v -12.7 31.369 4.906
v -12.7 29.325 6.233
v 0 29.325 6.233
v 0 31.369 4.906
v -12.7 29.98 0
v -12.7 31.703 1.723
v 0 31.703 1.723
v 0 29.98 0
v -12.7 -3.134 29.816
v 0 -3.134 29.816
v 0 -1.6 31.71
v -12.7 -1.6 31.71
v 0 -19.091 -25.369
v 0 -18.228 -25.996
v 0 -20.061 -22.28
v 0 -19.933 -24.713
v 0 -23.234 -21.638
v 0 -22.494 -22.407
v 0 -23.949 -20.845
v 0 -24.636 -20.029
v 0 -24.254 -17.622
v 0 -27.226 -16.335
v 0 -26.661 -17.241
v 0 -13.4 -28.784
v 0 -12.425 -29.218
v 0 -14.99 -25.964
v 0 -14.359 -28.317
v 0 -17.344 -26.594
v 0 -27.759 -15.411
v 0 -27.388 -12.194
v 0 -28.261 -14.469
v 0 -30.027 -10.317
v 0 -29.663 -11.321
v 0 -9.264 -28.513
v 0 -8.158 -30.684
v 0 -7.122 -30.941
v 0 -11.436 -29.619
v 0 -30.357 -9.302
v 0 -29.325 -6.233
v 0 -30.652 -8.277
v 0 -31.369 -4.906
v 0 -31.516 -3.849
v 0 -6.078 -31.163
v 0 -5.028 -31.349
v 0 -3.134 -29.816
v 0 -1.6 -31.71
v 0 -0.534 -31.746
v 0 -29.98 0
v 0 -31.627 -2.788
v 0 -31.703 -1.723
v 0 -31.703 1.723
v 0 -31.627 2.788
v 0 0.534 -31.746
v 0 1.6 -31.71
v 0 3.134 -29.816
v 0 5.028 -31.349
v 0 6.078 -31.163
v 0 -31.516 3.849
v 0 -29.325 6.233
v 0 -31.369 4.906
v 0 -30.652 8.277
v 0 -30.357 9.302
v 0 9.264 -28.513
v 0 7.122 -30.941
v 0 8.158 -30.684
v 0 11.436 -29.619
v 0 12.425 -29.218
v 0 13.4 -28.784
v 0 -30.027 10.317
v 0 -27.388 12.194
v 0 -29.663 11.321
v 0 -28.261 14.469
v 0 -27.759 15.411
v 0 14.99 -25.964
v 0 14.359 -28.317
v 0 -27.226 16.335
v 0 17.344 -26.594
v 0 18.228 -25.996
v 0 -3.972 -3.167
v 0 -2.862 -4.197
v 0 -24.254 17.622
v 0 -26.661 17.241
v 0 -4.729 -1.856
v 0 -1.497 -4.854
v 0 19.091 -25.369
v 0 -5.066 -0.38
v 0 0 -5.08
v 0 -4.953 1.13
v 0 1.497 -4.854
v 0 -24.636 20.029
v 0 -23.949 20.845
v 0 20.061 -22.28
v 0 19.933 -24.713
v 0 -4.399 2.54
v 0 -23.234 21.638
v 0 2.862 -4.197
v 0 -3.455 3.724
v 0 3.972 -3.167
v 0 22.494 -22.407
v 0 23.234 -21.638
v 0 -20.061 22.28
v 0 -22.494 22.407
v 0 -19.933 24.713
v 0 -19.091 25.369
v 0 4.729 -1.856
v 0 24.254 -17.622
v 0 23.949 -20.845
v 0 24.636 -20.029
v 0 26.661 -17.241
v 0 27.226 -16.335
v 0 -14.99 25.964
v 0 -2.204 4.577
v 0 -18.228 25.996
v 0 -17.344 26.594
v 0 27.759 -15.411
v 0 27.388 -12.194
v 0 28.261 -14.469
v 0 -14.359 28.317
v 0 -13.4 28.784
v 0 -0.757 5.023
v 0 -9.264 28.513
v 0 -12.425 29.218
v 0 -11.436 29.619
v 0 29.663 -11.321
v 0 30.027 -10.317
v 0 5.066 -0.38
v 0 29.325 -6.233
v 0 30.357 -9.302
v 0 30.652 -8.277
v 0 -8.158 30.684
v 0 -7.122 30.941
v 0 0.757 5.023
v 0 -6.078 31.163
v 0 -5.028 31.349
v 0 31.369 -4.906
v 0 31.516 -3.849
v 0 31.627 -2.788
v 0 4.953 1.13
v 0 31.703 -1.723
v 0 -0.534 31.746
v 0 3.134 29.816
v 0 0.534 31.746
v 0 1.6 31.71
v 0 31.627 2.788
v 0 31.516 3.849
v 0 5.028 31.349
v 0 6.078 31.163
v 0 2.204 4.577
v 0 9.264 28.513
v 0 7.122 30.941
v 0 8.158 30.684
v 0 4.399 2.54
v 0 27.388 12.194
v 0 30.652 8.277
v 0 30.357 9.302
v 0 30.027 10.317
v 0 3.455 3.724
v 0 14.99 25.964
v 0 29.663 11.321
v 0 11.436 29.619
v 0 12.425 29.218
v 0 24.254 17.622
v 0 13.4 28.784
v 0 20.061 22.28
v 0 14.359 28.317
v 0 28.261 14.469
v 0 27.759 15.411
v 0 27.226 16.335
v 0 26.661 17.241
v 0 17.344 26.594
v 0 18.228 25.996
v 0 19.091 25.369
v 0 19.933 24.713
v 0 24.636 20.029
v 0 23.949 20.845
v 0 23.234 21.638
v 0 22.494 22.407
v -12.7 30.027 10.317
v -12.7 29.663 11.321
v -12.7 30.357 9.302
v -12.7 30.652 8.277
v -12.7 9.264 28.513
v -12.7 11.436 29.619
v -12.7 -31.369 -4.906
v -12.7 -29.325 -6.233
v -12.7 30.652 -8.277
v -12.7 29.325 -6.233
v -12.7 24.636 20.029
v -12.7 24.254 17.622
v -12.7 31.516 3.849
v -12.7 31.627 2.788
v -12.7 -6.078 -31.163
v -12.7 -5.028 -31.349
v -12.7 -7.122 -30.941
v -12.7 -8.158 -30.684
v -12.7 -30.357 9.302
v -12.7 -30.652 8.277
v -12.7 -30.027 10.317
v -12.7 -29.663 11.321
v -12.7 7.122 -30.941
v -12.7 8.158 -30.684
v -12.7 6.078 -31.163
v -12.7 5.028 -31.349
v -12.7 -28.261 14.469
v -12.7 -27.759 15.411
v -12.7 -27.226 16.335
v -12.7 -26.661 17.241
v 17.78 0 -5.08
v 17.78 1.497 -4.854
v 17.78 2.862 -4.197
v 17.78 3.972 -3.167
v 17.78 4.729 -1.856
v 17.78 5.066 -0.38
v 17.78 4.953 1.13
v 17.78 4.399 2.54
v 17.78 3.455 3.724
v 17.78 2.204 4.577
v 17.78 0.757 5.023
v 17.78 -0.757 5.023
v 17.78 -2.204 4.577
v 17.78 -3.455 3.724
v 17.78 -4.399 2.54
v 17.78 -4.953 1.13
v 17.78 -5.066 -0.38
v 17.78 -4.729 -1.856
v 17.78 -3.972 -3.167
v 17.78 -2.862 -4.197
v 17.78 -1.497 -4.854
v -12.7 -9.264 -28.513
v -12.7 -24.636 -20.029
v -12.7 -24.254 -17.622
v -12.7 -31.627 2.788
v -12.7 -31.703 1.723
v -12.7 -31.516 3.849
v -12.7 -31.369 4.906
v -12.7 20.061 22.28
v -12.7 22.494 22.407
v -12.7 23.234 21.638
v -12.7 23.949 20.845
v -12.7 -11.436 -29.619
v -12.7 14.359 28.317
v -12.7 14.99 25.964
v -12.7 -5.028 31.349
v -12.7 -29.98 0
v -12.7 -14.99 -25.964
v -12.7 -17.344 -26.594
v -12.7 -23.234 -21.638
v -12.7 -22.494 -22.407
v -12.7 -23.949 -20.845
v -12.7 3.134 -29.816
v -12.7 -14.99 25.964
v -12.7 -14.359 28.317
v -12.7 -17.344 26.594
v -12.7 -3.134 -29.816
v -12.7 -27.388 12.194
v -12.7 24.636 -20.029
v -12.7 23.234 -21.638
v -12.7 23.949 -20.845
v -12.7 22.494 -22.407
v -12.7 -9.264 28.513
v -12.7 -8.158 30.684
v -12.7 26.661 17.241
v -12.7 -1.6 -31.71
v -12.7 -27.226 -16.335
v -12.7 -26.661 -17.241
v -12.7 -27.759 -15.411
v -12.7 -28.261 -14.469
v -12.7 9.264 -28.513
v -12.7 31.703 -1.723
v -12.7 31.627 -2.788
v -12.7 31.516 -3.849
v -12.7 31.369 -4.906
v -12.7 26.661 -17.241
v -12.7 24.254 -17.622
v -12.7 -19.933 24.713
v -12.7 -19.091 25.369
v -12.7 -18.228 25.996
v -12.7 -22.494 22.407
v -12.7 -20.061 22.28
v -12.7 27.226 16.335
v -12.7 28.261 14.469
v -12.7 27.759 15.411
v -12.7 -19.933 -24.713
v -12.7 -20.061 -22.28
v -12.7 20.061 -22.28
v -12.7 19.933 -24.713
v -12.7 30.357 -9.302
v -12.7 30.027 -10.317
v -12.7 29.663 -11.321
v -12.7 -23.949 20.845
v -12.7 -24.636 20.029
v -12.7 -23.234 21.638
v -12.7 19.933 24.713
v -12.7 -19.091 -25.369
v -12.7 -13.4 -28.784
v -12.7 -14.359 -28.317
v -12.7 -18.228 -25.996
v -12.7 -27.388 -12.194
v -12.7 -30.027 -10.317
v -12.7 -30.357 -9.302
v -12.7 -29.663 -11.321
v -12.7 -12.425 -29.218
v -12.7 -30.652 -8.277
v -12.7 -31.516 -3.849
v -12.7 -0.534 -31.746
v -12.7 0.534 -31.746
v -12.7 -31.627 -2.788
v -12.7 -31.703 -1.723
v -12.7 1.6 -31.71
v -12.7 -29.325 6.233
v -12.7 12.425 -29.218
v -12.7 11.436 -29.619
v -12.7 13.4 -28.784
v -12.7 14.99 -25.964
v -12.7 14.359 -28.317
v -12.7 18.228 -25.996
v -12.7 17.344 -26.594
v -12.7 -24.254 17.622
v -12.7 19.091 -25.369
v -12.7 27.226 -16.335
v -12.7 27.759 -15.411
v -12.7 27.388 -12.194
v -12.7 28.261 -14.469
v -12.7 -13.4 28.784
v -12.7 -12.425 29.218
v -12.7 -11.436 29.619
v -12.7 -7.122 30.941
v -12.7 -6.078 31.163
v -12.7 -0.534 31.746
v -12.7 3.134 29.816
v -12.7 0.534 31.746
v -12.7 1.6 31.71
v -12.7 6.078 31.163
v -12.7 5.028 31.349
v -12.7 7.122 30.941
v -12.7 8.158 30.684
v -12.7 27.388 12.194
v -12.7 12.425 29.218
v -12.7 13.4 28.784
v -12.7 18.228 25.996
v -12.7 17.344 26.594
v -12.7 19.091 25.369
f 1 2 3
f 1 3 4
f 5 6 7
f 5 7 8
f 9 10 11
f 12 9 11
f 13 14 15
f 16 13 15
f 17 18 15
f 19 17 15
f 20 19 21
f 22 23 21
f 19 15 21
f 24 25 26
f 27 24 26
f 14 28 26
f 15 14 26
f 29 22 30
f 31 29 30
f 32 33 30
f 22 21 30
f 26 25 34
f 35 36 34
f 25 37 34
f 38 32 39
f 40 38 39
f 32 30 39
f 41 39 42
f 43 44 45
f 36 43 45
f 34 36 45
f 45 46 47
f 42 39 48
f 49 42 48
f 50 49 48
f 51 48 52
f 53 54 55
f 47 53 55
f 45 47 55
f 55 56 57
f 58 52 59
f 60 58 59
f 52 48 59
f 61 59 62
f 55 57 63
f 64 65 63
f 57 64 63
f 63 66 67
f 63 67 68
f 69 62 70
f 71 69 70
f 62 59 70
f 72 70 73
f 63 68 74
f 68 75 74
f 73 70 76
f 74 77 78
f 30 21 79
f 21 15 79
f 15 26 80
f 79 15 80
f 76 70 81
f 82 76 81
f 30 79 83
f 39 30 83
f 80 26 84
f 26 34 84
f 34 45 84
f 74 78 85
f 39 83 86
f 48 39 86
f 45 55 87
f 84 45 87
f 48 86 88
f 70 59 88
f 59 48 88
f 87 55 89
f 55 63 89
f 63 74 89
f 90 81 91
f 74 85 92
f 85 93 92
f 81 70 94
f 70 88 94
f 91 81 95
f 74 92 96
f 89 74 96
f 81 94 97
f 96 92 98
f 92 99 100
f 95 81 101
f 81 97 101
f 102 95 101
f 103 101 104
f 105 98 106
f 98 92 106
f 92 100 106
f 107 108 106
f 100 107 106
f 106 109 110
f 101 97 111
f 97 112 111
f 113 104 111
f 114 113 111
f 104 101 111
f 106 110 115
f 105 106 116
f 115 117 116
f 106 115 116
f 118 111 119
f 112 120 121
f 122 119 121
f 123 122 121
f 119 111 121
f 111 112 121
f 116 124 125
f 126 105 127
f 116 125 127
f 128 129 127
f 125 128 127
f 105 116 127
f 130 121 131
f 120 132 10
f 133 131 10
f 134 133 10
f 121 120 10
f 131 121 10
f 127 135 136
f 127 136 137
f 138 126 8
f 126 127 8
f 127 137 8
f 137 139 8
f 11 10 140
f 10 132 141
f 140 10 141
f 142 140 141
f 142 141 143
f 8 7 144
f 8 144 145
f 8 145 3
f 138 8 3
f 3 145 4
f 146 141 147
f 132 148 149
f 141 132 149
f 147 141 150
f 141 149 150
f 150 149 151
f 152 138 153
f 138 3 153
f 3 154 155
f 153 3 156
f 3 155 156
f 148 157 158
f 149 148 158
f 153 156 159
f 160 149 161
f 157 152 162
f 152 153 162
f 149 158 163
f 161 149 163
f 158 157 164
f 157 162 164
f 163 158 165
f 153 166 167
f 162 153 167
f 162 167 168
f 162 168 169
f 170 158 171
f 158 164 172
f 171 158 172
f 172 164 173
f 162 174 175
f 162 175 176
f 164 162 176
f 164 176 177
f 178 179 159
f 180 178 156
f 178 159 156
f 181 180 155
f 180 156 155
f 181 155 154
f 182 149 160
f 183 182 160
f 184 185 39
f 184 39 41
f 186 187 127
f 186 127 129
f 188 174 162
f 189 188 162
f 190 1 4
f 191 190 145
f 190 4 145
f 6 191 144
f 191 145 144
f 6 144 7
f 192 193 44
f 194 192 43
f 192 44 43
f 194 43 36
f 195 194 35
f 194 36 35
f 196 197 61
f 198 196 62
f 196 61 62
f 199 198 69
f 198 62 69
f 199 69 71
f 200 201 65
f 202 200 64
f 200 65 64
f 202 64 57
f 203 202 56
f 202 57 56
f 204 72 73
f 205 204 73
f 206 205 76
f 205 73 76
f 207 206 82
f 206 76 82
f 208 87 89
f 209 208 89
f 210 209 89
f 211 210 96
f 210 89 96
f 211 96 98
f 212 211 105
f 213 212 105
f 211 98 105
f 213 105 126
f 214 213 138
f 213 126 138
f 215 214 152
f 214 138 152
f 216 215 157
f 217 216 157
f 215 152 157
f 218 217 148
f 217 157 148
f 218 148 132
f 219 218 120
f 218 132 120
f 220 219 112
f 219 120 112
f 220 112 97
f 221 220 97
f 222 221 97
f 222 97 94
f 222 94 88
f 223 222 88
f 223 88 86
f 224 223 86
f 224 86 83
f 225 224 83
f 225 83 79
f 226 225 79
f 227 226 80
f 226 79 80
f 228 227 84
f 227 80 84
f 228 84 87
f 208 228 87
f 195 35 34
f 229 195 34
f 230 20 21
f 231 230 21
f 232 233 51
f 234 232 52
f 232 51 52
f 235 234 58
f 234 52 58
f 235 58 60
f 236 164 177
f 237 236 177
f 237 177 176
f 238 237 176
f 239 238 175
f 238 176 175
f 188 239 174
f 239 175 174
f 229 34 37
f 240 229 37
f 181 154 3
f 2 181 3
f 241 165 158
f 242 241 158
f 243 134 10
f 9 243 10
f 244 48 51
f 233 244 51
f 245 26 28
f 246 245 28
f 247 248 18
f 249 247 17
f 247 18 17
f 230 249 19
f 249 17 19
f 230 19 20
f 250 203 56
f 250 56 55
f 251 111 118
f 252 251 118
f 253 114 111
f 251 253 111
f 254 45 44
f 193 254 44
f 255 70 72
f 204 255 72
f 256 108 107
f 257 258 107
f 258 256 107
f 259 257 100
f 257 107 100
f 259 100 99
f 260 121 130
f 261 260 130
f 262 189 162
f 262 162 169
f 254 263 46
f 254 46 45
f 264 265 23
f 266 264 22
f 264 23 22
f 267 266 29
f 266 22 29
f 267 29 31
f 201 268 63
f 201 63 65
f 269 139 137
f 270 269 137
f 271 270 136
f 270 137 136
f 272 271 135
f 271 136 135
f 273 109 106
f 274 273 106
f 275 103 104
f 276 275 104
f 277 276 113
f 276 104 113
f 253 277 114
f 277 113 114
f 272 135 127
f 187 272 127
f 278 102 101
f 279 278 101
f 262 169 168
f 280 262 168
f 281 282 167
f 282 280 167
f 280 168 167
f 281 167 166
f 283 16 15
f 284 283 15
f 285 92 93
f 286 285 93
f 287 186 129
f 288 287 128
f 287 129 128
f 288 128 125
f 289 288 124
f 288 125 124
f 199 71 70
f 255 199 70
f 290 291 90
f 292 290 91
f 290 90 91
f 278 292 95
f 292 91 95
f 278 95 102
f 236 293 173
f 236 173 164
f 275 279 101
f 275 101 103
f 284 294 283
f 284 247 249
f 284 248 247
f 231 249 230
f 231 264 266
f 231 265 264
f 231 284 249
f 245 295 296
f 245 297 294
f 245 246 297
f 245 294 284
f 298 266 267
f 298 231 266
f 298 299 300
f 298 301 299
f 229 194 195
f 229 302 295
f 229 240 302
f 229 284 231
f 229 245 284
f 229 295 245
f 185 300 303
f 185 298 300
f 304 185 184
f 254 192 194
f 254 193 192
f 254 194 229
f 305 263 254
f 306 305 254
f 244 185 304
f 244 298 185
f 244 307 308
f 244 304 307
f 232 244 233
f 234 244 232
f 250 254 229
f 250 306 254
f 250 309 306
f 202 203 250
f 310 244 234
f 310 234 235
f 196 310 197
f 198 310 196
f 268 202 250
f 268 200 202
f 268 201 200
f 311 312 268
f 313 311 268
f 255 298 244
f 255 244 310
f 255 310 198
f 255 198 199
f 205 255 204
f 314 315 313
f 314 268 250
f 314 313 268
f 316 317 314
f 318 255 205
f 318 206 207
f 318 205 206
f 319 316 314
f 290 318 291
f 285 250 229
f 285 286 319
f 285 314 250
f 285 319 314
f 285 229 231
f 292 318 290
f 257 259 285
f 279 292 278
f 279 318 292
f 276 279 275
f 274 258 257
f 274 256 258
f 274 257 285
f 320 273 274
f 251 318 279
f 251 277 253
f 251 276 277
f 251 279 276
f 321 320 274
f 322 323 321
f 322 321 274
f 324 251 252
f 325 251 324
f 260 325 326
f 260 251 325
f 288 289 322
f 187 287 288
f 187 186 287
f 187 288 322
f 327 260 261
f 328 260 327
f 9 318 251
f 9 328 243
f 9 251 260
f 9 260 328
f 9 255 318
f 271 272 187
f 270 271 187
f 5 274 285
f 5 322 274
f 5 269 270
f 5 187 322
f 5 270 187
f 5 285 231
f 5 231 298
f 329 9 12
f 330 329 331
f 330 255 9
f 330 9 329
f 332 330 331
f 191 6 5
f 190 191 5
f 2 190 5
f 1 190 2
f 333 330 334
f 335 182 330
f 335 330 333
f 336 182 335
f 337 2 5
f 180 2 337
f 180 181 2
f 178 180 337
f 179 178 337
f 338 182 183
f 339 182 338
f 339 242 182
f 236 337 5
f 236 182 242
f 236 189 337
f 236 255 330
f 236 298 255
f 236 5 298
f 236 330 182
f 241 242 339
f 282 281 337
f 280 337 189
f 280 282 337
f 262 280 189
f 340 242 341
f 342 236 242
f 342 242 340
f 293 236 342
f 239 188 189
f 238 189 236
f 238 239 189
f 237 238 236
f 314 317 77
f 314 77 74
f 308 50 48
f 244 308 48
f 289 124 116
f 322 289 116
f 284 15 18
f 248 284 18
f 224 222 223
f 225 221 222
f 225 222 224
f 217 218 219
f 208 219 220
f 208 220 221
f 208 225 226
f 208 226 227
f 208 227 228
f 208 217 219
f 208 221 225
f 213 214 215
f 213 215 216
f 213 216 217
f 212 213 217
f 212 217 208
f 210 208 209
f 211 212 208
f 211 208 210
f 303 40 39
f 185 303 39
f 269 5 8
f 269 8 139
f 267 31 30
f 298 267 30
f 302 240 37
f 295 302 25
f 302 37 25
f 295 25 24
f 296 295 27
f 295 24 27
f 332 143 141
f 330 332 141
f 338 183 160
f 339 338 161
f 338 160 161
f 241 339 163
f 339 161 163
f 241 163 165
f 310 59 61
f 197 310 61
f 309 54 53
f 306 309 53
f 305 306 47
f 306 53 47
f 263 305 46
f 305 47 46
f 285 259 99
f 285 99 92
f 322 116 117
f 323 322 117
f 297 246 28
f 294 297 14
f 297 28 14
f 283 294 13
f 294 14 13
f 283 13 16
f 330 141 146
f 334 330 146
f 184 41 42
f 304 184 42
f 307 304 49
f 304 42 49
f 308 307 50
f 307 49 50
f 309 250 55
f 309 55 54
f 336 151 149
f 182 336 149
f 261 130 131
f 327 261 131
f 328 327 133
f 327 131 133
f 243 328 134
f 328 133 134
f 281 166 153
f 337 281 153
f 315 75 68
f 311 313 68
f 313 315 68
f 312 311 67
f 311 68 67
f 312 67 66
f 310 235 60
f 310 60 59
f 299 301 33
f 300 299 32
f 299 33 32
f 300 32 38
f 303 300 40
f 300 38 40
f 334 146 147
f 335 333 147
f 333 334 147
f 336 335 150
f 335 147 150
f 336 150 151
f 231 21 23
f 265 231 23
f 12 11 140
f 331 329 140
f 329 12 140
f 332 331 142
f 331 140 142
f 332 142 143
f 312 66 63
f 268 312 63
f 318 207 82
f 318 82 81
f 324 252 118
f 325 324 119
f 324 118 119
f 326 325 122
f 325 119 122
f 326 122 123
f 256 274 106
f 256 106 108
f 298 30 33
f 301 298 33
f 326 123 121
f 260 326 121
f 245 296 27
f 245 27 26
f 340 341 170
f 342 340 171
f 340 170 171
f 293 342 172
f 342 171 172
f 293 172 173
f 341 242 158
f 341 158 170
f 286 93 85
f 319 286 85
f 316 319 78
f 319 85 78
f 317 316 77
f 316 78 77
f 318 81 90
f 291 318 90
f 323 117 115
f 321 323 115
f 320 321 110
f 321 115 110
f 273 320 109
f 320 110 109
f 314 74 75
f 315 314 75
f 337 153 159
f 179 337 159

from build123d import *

# Parameters (mm, degrees)
SKETCH1_R           = 5.08
BOSS_EXTRUDE1_DEPTH = 17.78
SKETCH2_R           = 31.75
BOSS_EXTRUDE2_DEPTH = 12.7
CUT_EXTRUDE2_DEPTH  = 49.293409488
CIRPATTERN2_COUNT   = 30


with BuildPart() as part:
    # Sketch1 → Boss-Extrude1 (new body)
    with BuildSketch(Plane(origin=(0, 0, 0), x_dir=(0, 0, -1), z_dir=(1, 0, 0))):
        Circle(SKETCH1_R)
    extrude(amount=BOSS_EXTRUDE1_DEPTH)

    # Sketch2 → Boss-Extrude2 (add)
    with BuildSketch(Plane.ZY):
        Circle(SKETCH2_R)
    extrude(amount=BOSS_EXTRUDE2_DEPTH)

    # Sketch5 → Cut-Extrude2 (cut, through all)
    with BuildSketch(Plane(origin=(0, 0, 0), x_dir=(0, 0, -1), z_dir=(1, 0, 0))):
        with BuildLine():
            Line((0, 29.980101005), (1.723107067, 31.703208072))
            ThreePointArc((1.723107067, 31.703208072), (0, 31.75), (-1.723107067, 31.703208072))
            Line((-1.723107067, 31.703208072), (0, 29.980101005))
        make_face()
    cut_extrude2 = extrude(amount=-CUT_EXTRUDE2_DEPTH, mode=Mode.SUBTRACT)

    # CirPattern2: Cut-Extrude2 ×30 about axis
    cirpattern2_axis = Axis((0, 0, 0), (1, 0, 0))
    for i in range(1, CIRPATTERN2_COUNT):
        add(cut_extrude2.rotate(cirpattern2_axis, i * 360 / CIRPATTERN2_COUNT), mode=Mode.SUBTRACT)


solid = part.part
